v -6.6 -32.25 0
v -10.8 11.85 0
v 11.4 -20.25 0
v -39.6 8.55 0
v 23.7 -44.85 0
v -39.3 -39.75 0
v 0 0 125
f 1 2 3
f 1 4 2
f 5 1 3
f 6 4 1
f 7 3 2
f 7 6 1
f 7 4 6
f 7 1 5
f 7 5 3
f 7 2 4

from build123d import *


with BuildPart() as f3:
    # F0 (on Top) → F3 section 0
    with BuildSketch(Plane.XY, mode=Mode.PRIVATE) as f3_s0:
        Polygon((-10.8, 11.85), (-39.6, 8.55), (-39.300002, -39.750002), (-6.6, -32.250002), (23.700001, -44.850003), (11.4, -20.250002), align=None)
    loft([f3_s0.sketch, Vertex(0, 0, 125)])


solid = f3.part
